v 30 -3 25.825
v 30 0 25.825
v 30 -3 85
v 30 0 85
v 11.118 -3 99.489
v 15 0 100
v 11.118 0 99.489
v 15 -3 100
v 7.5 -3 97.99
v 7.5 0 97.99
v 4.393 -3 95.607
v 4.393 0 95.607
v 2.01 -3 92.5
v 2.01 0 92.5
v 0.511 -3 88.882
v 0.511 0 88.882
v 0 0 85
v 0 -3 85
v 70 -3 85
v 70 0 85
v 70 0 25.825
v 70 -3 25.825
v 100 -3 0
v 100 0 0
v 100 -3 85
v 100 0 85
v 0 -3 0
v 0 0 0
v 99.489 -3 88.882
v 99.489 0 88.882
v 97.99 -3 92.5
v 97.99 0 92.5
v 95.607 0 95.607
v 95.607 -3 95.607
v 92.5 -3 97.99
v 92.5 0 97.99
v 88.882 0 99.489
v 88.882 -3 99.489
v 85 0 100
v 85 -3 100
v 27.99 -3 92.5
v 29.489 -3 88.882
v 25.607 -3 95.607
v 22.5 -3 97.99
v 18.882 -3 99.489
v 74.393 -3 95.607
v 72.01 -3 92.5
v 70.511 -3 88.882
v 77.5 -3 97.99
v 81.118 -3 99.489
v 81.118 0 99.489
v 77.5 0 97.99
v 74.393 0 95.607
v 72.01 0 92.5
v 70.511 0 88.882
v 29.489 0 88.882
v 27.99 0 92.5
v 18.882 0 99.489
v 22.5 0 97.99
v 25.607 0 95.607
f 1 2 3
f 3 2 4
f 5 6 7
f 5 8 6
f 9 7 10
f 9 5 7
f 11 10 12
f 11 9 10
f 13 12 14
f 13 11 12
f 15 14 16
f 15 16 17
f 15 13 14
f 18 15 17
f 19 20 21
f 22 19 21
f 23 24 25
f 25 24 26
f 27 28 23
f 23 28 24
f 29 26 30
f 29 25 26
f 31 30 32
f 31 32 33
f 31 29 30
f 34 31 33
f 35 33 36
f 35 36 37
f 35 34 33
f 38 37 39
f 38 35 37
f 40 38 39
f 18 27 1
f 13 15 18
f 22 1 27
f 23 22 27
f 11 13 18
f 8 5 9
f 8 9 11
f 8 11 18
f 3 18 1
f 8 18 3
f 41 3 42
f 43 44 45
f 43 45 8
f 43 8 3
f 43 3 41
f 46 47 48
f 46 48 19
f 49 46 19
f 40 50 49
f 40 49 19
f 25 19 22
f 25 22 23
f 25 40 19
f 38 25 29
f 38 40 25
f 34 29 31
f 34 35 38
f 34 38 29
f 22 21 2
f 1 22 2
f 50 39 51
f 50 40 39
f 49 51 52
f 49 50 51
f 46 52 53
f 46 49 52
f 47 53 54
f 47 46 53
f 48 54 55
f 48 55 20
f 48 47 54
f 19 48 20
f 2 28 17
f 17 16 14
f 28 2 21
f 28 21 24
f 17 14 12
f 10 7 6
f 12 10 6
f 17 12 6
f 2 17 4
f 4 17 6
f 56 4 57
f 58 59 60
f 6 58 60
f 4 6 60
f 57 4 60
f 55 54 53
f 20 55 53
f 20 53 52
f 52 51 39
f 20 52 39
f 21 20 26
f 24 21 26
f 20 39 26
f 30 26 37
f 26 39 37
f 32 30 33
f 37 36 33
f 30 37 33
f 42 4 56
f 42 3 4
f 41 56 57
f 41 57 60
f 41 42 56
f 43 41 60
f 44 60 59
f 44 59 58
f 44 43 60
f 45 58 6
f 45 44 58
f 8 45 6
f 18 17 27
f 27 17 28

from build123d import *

# Parameters (mm, degrees)
F1_DEPTH = 3
F2_R     = 14.99999


# Not quite as in the source:
# - a fillet or chamfer is up to 0.001 mm smaller than in the source, because OpenCascade refuses the exact size


with BuildPart() as f1:
    # F0 (on Front) → F1 (new body)
    with BuildSketch(Plane.XZ):
        Polygon((0, 25.8250685402), (0, 0), (100, 0), (100, 25.8250685402), (100, 100), (70, 100), (70, 25.8250685402), (30, 25.8250685402), (30, 100), (0, 100), align=None)
    extrude(amount=F1_DEPTH)

    # F2 (radius 15 in the source; OpenCascade refuses exactly that, so slightly less here)
    f2_edges = [f1.edges().sort_by_distance(p)[0] for p in [
        (100, -1.5, 100),
        (70, -1.5, 100),
        (30, -1.5, 100),
        (0, -1.5, 100),
    ]]
    fillet(f2_edges, radius=F2_R)


solid = f1.part
